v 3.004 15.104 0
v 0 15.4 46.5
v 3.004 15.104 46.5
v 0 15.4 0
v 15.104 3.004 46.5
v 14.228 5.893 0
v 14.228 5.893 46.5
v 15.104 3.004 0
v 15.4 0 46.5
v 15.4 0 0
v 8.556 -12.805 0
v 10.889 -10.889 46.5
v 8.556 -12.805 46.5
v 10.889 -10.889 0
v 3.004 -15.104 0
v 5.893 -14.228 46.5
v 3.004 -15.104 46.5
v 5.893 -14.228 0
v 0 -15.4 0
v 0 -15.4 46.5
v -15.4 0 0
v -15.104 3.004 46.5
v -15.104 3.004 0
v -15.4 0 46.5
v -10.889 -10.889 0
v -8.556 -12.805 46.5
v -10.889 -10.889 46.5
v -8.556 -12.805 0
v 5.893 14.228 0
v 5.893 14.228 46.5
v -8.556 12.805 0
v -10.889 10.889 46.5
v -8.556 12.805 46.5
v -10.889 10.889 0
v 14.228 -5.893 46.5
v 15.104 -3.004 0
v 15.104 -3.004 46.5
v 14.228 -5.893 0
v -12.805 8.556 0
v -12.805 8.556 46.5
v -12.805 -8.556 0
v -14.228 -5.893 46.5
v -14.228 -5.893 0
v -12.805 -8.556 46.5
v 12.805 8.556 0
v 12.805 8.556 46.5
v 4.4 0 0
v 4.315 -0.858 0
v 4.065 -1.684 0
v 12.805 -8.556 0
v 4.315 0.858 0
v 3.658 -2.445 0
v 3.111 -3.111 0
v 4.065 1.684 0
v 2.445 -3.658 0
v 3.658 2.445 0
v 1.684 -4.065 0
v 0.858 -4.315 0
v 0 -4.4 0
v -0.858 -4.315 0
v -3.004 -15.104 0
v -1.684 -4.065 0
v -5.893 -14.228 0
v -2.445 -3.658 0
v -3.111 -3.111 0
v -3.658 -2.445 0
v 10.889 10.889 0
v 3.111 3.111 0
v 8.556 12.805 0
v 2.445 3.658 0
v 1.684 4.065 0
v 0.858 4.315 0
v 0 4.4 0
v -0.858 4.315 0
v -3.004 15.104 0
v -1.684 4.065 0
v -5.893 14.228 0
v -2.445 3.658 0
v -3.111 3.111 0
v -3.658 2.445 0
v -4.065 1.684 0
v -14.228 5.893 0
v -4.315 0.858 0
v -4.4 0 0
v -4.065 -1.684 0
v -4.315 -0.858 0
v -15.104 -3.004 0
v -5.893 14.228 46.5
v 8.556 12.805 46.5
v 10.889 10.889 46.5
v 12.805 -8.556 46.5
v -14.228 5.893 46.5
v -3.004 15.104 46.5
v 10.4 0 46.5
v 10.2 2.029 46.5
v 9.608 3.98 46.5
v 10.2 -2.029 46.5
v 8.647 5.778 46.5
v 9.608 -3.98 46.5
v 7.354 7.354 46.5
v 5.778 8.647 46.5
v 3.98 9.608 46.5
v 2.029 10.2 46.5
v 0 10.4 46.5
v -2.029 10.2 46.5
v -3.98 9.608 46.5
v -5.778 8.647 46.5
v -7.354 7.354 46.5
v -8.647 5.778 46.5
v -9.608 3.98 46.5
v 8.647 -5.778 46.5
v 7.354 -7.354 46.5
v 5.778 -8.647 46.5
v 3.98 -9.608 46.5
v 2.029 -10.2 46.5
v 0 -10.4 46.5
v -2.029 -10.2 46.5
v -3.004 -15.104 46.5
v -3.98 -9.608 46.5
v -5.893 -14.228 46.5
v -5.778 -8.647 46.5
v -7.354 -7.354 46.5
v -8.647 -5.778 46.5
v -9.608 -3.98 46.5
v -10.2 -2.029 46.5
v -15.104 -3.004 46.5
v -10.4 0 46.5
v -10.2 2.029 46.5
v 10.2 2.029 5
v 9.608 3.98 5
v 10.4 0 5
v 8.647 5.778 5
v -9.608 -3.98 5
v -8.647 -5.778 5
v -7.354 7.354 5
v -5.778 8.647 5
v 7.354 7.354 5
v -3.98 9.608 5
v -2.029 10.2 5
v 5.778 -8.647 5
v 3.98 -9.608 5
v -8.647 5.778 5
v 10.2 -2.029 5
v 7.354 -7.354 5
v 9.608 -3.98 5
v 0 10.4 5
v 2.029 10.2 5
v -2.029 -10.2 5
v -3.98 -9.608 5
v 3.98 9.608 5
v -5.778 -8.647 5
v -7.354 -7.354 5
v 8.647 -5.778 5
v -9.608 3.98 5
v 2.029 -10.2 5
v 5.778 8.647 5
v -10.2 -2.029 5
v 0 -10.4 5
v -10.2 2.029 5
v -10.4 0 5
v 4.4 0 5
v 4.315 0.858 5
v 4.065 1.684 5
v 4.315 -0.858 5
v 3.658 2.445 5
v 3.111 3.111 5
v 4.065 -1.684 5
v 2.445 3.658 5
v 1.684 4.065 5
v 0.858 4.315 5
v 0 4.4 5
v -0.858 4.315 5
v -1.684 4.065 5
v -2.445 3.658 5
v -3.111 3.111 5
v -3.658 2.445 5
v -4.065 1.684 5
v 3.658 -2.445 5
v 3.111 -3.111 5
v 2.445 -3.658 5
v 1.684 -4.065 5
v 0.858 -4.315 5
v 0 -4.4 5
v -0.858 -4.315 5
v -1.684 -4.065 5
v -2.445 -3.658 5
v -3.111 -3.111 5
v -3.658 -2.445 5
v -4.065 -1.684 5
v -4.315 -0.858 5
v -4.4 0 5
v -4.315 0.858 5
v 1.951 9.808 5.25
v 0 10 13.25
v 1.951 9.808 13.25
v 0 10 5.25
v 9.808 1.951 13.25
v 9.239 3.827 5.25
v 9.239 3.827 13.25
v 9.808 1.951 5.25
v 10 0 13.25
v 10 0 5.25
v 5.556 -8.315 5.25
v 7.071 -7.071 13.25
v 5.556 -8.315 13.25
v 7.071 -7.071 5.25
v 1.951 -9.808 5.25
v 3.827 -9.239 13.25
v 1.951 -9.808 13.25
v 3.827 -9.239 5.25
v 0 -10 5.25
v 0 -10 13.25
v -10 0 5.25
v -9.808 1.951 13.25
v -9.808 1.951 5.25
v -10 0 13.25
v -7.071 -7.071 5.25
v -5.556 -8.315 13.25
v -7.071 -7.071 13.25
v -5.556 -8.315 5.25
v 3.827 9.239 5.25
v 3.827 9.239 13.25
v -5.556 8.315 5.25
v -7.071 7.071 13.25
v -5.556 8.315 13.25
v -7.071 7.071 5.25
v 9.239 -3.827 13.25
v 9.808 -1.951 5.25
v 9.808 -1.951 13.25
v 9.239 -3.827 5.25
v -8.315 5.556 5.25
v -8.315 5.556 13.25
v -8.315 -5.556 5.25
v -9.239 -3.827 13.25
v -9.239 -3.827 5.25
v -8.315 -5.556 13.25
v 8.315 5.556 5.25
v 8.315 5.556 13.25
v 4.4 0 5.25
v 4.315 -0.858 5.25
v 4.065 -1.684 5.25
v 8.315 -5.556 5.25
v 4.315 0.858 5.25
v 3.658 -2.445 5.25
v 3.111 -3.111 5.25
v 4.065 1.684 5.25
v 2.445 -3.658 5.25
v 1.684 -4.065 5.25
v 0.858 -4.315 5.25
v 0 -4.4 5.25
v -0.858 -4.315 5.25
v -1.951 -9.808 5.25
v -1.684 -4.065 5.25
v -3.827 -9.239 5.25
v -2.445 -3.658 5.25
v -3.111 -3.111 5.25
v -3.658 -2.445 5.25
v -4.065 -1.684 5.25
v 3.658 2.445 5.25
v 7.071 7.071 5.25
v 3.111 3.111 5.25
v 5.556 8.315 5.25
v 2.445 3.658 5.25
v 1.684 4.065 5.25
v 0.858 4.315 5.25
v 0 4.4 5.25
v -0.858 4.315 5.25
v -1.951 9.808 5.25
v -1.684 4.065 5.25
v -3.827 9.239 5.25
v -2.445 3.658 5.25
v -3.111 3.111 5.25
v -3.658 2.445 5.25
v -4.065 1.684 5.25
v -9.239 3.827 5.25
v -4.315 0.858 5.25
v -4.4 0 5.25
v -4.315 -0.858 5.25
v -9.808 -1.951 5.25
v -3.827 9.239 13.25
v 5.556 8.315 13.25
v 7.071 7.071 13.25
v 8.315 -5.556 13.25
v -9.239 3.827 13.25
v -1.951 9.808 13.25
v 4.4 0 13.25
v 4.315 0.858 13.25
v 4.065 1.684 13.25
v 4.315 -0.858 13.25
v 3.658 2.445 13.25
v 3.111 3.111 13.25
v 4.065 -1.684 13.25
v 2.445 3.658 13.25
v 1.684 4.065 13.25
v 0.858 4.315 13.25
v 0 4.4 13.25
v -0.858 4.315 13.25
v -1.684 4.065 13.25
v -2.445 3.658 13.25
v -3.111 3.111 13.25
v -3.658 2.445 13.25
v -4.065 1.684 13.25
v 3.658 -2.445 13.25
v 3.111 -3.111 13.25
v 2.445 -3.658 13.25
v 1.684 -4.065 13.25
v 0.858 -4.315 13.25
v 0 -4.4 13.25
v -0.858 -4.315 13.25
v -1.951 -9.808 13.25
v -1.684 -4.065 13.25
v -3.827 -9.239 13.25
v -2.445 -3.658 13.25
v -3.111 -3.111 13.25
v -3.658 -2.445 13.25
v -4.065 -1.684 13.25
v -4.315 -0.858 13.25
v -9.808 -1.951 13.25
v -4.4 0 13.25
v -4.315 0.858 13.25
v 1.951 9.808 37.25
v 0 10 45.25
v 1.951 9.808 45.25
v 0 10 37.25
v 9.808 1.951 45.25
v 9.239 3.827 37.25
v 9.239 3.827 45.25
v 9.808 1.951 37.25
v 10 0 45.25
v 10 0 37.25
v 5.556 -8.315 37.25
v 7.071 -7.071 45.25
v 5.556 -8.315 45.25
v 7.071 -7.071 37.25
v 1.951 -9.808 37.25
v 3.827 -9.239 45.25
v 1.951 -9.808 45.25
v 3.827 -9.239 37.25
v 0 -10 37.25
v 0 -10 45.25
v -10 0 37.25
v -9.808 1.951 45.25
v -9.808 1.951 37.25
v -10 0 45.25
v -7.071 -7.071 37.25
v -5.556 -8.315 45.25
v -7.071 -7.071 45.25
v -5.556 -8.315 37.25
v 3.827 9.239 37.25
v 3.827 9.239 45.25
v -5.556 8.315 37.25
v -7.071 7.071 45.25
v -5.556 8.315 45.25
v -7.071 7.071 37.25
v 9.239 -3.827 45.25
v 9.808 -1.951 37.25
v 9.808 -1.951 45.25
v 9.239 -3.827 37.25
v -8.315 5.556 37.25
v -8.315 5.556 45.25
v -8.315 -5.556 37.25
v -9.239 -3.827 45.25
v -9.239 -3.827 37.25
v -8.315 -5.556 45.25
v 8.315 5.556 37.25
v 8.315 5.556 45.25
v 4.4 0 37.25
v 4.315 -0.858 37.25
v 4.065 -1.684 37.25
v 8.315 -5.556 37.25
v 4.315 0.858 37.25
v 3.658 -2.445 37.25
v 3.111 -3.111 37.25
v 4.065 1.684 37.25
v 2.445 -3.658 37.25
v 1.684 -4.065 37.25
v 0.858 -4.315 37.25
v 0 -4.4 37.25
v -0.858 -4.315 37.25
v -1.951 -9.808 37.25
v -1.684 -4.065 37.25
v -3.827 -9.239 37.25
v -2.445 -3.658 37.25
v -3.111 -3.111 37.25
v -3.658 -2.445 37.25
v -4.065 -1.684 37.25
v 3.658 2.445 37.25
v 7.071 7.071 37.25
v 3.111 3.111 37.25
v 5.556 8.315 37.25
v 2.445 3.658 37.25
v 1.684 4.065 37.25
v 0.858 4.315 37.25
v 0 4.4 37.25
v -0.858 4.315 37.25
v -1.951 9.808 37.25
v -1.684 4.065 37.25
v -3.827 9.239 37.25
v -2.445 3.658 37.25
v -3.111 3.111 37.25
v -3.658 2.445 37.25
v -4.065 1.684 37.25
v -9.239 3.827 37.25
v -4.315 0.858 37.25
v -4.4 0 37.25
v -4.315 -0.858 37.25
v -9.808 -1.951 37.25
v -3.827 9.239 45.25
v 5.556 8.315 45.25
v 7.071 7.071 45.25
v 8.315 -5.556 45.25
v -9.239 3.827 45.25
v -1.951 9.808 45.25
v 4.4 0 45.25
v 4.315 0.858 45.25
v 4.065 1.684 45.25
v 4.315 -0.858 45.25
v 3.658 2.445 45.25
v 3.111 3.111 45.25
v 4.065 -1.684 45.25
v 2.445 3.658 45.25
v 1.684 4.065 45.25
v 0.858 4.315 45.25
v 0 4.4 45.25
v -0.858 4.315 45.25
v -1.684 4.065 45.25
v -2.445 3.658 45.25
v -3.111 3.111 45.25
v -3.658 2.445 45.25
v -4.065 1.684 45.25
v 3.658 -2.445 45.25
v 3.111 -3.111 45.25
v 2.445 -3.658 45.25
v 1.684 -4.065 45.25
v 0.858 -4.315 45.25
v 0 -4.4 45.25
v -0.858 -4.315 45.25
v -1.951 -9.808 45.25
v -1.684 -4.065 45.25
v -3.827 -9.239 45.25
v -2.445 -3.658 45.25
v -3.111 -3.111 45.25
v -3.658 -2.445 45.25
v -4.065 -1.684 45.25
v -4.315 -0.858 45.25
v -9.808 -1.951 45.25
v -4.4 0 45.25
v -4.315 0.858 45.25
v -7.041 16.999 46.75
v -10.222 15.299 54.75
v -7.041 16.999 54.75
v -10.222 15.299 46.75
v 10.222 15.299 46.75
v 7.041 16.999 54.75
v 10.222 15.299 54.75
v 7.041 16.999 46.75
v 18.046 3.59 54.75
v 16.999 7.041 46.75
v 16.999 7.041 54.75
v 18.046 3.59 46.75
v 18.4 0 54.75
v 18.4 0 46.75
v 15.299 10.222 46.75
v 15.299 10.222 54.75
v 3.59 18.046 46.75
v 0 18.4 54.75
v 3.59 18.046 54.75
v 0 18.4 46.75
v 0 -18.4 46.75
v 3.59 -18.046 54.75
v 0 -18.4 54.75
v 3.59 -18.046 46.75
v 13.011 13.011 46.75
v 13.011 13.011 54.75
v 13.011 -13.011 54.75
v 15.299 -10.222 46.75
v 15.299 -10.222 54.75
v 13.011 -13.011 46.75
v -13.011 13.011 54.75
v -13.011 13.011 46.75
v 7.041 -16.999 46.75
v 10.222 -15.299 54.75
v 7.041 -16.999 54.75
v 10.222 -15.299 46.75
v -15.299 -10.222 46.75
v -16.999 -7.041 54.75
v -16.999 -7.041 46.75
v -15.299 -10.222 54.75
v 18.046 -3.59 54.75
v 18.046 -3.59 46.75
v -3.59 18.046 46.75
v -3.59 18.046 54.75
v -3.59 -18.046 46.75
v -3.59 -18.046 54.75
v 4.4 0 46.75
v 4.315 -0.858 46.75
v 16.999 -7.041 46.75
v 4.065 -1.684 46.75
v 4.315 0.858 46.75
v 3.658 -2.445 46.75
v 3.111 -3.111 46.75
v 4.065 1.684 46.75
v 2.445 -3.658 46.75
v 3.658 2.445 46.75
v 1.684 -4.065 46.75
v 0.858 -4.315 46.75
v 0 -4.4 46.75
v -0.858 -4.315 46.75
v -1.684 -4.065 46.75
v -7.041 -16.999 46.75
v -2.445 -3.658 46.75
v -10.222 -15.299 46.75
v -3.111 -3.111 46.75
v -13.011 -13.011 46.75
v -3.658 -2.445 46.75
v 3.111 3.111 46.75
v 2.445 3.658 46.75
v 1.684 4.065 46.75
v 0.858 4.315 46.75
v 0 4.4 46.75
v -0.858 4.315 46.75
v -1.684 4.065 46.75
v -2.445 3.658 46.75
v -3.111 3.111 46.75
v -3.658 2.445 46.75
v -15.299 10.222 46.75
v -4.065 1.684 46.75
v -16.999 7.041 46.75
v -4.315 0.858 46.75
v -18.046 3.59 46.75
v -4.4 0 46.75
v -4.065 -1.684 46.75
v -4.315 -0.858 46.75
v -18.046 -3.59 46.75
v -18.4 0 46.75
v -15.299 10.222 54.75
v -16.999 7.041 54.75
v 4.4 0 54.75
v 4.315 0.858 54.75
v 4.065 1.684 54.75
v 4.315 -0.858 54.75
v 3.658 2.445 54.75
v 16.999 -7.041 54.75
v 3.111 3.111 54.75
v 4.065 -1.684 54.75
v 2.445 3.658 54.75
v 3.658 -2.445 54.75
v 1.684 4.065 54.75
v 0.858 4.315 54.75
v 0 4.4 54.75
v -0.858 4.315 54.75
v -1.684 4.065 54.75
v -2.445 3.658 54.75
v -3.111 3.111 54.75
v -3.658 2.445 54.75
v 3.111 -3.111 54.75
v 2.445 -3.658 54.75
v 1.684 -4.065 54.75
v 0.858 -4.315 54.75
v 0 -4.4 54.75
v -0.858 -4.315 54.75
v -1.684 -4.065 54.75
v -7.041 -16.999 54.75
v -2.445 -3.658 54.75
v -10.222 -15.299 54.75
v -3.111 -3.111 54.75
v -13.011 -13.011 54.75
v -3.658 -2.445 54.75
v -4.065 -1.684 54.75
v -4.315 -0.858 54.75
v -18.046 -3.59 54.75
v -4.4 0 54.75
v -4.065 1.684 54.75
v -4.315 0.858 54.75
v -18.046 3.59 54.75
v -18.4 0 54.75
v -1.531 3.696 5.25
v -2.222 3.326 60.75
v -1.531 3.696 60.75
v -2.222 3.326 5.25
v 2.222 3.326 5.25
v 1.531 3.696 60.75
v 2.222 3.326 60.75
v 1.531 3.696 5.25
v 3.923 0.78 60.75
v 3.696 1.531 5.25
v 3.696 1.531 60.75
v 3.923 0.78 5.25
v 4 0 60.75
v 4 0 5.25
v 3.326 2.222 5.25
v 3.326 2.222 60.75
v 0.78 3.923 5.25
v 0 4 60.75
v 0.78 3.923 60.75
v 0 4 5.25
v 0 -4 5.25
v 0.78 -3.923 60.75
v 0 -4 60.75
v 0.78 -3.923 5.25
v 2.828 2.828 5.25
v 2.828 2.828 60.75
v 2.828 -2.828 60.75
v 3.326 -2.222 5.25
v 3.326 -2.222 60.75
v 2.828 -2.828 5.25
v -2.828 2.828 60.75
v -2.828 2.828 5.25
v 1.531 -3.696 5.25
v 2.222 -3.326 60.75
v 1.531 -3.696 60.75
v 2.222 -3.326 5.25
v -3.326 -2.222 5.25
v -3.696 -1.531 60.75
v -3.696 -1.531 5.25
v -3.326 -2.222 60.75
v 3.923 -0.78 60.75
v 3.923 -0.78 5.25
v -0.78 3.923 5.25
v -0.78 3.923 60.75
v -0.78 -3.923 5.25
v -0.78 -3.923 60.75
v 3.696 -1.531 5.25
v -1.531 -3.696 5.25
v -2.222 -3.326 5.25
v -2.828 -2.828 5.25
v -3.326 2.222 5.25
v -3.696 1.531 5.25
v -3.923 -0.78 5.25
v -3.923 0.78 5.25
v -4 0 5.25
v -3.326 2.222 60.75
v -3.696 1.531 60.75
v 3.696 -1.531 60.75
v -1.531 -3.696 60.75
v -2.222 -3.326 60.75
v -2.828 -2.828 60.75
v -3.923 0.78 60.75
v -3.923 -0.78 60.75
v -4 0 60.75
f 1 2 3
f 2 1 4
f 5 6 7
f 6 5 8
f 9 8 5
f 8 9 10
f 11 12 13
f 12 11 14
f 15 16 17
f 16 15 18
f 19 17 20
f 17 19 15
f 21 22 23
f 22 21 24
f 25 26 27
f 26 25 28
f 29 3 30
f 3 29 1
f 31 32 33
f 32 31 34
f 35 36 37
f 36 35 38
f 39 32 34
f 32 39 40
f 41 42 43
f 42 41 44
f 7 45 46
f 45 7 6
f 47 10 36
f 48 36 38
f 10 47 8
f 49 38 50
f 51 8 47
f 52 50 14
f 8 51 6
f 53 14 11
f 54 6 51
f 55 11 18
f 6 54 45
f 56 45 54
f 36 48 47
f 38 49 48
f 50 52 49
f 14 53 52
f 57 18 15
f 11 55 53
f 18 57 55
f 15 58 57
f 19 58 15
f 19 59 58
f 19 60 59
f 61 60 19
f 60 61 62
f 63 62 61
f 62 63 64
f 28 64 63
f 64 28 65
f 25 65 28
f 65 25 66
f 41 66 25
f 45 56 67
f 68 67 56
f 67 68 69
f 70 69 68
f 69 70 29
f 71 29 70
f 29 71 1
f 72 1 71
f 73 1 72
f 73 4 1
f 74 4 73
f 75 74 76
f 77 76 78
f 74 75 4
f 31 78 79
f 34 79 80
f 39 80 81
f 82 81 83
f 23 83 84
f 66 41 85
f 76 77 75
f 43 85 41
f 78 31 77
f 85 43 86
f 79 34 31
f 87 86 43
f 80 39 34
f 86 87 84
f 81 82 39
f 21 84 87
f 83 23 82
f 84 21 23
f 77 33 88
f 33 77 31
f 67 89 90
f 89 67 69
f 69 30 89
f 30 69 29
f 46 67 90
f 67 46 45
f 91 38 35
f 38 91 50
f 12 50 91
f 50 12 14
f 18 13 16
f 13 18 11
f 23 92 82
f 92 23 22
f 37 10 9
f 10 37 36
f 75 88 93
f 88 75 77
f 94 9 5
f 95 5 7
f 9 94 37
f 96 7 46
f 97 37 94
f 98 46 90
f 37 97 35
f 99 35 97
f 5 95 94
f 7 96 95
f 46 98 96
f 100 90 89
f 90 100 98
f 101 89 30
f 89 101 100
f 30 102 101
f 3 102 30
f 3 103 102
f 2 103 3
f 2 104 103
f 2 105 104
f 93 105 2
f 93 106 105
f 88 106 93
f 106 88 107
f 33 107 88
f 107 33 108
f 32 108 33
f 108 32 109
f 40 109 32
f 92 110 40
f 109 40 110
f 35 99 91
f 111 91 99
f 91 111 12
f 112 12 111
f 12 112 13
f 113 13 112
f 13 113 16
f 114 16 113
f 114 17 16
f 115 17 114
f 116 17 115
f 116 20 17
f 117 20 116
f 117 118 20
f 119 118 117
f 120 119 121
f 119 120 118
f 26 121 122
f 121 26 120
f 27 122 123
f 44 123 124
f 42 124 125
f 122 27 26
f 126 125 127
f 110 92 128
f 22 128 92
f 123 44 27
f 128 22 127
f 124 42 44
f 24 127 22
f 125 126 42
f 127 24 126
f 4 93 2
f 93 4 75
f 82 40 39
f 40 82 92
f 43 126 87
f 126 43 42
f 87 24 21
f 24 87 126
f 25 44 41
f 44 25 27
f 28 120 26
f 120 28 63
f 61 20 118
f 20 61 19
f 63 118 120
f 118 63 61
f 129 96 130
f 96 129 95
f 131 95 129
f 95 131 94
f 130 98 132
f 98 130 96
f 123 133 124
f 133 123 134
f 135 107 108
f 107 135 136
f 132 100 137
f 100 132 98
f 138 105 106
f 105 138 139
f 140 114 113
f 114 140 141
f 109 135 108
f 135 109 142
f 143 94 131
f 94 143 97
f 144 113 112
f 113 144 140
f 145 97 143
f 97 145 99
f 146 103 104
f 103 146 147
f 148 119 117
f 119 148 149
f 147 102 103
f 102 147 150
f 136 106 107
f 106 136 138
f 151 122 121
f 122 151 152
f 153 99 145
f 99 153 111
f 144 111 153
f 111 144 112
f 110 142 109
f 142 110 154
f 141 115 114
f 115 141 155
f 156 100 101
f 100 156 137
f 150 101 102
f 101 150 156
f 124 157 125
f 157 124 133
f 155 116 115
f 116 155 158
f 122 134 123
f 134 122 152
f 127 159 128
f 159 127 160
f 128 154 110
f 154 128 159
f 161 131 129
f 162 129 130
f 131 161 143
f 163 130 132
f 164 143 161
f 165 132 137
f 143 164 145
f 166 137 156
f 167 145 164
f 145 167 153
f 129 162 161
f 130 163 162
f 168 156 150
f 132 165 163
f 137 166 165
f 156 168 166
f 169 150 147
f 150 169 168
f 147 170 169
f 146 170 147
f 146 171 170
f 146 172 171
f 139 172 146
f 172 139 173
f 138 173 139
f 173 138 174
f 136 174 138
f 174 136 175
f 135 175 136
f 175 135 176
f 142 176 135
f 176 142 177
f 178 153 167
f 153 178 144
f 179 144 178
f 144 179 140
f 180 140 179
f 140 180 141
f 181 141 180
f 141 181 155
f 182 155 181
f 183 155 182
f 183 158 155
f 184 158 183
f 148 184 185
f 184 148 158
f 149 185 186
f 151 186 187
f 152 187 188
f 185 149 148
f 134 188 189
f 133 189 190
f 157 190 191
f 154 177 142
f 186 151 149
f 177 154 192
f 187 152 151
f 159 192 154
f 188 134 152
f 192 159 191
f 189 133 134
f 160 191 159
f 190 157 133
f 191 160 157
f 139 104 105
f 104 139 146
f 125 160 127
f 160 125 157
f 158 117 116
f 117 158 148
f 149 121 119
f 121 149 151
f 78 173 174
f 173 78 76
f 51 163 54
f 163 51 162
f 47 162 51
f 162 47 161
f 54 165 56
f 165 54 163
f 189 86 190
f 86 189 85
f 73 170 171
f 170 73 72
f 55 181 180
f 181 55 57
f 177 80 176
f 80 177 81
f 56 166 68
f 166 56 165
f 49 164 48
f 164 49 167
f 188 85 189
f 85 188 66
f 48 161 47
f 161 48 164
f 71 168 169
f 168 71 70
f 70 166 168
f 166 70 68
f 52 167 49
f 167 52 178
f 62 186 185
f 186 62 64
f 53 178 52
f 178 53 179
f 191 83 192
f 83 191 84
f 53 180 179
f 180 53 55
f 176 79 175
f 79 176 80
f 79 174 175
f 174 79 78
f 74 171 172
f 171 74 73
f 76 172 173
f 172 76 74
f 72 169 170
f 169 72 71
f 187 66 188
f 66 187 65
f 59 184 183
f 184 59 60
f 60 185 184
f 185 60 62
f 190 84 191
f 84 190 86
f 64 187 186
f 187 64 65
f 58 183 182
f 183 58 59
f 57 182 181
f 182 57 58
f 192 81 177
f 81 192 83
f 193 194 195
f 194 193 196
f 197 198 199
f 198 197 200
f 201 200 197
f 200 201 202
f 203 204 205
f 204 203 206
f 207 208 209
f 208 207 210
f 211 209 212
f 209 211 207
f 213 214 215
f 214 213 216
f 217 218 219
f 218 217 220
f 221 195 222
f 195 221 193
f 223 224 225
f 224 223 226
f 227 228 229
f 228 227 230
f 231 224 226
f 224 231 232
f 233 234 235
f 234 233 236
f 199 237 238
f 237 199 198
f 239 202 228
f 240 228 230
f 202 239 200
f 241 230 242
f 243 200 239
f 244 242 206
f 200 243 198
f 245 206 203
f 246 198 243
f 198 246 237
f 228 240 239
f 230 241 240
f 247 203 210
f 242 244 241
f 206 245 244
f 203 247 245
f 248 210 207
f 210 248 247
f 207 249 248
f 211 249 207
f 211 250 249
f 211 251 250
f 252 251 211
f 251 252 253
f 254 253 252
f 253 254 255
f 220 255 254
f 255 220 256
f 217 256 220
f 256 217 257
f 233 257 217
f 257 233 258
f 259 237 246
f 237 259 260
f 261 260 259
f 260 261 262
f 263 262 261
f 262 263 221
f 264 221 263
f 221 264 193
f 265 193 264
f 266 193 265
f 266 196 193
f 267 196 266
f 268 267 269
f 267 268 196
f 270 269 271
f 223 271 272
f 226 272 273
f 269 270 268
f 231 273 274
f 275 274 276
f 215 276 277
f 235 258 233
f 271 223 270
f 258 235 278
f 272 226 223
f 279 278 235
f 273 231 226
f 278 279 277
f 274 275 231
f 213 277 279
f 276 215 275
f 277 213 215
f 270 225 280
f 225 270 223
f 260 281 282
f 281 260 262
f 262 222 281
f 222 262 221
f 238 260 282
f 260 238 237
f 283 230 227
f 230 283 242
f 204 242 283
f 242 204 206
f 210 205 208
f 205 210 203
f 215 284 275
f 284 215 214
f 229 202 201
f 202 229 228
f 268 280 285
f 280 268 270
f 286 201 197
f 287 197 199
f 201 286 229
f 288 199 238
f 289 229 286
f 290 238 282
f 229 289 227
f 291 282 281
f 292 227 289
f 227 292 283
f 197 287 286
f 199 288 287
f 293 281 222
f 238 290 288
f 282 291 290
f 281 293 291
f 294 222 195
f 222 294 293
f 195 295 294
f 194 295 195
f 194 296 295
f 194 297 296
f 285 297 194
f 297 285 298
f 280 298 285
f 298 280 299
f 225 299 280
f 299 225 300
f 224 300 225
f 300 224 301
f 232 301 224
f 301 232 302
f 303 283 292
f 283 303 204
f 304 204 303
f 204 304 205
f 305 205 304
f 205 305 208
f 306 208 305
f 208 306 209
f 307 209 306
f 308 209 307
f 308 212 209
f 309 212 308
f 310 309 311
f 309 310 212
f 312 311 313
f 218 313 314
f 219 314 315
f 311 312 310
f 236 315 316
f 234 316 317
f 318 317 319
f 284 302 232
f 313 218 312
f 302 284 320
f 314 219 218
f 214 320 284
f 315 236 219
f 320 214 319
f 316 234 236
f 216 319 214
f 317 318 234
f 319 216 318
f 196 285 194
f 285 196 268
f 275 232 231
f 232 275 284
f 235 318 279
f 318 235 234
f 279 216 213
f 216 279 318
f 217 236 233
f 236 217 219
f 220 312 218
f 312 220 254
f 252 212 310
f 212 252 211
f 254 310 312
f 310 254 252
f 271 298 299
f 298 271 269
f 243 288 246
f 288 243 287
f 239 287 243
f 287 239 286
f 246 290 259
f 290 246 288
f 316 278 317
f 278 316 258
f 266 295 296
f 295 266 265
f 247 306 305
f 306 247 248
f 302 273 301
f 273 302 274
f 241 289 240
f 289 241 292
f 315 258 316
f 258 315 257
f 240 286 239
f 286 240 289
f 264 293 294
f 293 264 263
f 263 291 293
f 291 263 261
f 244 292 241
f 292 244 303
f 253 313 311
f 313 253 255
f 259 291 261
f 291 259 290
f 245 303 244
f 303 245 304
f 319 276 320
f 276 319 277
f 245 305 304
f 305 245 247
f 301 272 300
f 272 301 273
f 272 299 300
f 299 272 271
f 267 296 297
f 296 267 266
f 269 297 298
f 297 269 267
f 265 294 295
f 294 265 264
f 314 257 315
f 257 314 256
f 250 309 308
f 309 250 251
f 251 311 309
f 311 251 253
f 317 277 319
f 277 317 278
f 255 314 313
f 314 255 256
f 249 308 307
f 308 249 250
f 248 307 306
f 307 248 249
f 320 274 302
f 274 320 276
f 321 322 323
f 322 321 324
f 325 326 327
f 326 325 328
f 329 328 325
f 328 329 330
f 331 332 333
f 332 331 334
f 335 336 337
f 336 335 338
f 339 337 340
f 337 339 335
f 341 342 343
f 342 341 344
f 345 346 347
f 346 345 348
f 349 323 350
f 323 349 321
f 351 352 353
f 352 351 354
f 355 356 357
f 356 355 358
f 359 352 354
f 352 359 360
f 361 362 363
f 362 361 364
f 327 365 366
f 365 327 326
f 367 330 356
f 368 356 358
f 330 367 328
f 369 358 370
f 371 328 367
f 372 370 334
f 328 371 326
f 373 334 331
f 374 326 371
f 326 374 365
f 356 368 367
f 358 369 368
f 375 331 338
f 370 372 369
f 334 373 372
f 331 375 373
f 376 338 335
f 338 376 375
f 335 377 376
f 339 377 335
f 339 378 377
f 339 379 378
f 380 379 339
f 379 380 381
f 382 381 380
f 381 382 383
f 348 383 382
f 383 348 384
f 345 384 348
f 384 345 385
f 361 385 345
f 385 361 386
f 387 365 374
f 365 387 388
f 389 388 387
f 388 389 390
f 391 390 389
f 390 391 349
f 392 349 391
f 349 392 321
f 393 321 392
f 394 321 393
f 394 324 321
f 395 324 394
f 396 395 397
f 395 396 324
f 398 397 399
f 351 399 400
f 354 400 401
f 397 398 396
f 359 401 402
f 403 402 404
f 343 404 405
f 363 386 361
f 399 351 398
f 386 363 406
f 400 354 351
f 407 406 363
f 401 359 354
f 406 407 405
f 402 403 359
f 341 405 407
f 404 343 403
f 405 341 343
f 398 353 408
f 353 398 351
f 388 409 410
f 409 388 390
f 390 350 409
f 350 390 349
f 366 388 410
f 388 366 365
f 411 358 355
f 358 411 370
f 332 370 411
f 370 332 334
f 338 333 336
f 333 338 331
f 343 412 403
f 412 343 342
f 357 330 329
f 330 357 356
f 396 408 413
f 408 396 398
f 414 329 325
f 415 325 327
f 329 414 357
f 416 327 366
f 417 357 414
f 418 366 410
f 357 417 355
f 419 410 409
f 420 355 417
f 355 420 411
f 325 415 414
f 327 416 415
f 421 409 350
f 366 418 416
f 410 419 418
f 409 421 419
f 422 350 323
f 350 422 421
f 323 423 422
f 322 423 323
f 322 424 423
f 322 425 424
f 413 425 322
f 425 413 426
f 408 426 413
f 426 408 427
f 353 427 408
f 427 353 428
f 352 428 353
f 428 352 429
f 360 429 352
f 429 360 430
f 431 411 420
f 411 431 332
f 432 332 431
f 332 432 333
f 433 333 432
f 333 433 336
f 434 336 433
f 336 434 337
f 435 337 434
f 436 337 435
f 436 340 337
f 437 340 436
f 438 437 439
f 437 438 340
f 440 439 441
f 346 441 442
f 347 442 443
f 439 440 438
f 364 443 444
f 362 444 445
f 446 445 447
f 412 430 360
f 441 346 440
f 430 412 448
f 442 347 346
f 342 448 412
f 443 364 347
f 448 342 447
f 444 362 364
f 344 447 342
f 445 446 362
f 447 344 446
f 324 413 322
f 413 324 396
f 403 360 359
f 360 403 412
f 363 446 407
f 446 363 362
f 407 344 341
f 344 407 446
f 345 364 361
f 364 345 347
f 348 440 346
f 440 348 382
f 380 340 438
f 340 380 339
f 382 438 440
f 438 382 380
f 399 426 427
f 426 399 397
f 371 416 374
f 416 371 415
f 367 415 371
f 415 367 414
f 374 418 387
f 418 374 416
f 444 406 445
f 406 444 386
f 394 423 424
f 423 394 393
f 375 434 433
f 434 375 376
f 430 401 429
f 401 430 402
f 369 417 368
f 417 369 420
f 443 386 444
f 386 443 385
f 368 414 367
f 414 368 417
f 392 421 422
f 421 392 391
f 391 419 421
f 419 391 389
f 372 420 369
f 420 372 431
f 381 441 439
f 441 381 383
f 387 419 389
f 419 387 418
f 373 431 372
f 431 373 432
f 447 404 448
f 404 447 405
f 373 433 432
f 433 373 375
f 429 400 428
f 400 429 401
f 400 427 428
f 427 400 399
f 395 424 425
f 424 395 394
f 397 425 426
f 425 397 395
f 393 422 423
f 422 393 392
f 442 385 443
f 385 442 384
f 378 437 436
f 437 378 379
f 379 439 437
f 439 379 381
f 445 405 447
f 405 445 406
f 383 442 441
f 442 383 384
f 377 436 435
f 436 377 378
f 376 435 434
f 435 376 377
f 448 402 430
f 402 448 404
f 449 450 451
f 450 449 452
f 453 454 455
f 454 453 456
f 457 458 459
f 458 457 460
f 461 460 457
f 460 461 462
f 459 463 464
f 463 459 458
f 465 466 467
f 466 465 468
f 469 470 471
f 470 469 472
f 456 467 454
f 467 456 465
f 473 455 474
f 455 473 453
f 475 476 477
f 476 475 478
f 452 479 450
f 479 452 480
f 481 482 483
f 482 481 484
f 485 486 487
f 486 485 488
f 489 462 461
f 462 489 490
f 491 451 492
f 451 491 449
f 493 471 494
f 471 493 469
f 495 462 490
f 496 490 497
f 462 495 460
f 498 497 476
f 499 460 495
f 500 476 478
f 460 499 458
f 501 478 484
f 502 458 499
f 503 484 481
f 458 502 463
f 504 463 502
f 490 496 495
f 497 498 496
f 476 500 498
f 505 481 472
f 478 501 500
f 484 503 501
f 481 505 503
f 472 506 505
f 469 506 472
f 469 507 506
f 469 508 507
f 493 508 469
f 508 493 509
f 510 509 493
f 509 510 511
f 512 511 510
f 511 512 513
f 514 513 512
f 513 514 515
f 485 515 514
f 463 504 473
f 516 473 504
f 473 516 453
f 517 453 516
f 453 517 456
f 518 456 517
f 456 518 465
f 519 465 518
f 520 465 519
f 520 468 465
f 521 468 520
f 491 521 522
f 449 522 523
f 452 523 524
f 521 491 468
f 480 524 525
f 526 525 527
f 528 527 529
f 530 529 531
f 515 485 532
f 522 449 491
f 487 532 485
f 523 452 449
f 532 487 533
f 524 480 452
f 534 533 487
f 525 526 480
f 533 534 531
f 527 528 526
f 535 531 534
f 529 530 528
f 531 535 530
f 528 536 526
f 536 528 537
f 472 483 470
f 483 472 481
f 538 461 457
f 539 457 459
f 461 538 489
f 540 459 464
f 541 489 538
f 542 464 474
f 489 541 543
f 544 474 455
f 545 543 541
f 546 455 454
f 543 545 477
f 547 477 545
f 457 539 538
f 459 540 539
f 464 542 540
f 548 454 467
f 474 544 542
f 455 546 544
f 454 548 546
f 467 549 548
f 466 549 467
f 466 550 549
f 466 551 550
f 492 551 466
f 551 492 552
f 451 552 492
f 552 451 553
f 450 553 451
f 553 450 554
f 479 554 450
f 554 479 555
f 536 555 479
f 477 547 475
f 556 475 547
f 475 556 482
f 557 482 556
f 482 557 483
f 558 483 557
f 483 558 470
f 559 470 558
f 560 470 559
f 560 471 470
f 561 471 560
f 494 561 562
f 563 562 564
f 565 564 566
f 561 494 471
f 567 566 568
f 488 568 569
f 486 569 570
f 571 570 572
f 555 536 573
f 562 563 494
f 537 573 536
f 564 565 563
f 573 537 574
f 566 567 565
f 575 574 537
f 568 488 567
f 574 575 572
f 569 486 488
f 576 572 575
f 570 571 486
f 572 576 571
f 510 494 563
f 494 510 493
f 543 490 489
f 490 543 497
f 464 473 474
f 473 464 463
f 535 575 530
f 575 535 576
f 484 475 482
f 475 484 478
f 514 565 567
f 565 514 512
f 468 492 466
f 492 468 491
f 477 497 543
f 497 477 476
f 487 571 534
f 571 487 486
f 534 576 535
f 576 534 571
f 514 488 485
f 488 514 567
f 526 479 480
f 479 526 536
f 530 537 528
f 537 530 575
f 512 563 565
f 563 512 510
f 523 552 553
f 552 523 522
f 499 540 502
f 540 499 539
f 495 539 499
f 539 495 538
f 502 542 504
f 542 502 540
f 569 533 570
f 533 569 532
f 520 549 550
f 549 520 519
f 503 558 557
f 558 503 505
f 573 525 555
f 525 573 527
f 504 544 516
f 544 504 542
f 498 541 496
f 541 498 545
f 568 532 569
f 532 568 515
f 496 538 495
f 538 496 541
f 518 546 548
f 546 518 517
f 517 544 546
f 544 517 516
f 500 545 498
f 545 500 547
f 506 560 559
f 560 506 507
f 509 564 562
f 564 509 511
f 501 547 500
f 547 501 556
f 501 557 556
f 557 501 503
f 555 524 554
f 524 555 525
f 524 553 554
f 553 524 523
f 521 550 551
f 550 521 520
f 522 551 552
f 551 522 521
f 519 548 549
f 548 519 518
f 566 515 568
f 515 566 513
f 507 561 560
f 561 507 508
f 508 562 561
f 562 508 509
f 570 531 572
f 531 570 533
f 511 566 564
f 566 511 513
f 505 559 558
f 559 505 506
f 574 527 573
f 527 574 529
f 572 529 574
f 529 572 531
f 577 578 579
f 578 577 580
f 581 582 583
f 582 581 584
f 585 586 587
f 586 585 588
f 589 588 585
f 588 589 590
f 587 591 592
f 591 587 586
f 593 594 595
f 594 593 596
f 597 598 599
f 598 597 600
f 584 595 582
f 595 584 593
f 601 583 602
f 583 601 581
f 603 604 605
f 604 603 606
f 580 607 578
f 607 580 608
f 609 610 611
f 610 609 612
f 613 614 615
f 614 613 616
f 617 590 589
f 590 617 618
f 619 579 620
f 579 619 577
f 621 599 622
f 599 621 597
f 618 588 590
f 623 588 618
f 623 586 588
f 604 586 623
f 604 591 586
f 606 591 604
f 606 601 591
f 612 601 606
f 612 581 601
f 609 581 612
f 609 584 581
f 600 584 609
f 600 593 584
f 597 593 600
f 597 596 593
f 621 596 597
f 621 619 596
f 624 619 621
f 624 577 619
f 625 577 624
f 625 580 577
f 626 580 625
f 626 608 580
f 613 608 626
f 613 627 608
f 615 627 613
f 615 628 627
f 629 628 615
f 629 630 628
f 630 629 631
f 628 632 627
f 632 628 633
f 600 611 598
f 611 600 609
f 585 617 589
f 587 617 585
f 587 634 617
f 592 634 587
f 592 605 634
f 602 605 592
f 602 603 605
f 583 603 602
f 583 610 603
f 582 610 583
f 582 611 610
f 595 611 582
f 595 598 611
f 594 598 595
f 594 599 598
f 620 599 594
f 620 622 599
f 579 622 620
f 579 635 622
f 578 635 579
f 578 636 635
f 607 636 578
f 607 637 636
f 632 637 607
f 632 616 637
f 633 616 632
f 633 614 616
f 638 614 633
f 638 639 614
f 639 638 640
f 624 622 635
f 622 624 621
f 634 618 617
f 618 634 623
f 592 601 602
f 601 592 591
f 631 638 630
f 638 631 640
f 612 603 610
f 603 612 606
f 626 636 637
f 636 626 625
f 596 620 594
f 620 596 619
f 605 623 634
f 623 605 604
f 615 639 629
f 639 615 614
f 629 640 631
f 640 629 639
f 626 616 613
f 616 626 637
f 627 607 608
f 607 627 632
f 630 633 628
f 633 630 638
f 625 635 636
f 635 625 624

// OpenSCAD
$fn = 32;

// ------------------------------------------------------------------------
// Shaft station: cup d30.8 x 46.5 mm, shaft d8
// Every part is its own module, assembly() places every instance.
// ------------------------------------------------------------------------

// --- part 1 ---
module housing_cup() {
  difference() {
    cylinder(h = 46.5, d = 30.8);
    translate([0, 0, 5]) cylinder(h = 42.5, d = 20.8);
    translate([0, 0, -1]) cylinder(h = 7, d = 8.8);
  }
}

// --- part 2 ---
module bearing_lower() {
  difference() {
      translate([0, 0, 0]) cylinder(h = 8, d = 20);
      translate([0, 0, -1]) cylinder(h = 10, d = 8.8);
    }
}

// --- part 3 ---
module bearing_upper() {
  difference() {
      translate([0, 0, 0]) cylinder(h = 8, d = 20);
      translate([0, 0, -1]) cylinder(h = 10, d = 8.8);
    }
}

// --- part 4 ---
module station_shaft() {
  translate([0, 0, -27.75]) cylinder(h = 55.5, d = 8);
}

// --- part 5 ---
module station_cover() {
  difference() {
    cylinder(h = 8, d = 36.8);
    translate([0, 0, -1]) cylinder(h = 10, d = 8.8);
  }
}

// --- assembly ---
module assembly() {
  color([0.80, 0.24, 0.20]) translate([0, 0, 0]) rotate([0, 0, 0]) housing_cup();
  color([0.20, 0.45, 0.75]) translate([0, 0, 5.25]) rotate([0, 0, 0]) bearing_lower();
  color([0.25, 0.62, 0.32]) translate([0, 0, 37.25]) rotate([0, 0, 0]) bearing_upper();
  color([0.92, 0.70, 0.18]) translate([0, 0, 33]) rotate([0, 0, 0]) station_shaft();
  color([0.58, 0.35, 0.70]) translate([0, 0, 46.75]) rotate([0, 0, 0]) station_cover();
}

assembly();
